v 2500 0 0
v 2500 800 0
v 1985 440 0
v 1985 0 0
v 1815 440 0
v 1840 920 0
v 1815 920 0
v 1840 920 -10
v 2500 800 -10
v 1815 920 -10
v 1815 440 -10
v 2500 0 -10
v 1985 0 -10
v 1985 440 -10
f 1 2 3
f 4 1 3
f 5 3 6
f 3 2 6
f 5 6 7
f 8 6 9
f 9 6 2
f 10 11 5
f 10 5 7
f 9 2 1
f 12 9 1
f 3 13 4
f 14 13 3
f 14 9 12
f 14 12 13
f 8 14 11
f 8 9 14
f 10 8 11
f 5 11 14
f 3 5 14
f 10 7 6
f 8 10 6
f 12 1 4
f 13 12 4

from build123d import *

# Parameters (mm, degrees)
TABAN_FLAN_1_DEPTH         = 10
KES_EKSTR_ZYON1_DEPTH      = 2664.925674639
KES_EKSTR_ZYON1_DEPTH_BACK = 2664.925674639
IZIM2_W                    = 1985
IZIM2_H                    = 440
KES_EKSTR_ZYON2_DEPTH      = 2664.925674639
KES_EKSTR_ZYON2_DEPTH_BACK = 2664.925674639
IZIM4_W                    = 2142.353076874
IZIM4_H                    = 1059.200267334
KES_EKSTR_ZYON3_DEPTH      = 2664.925674639
KES_EKSTR_ZYON3_DEPTH_BACK = 2664.925674639
IZIM5_W                    = 190.659324766
IZIM5_H                    = 598.86582779


# Sheet-metal steps are written as plain solids
with BuildPart() as part:
    # Çizim1 → Taban-Flanş1 (new body)
    with BuildSketch(Plane.XY):
        Polygon((0, 0), (0, 800), (660, 920), (1840, 920), (2500, 800), (2500, 0), align=None)
    extrude(amount=-TABAN_FLAN_1_DEPTH)

    # Çizim2 → Kes-Ekstrüzyon1 (cut, two sides: drawn at the far end of the back side and taken through both)
    with BuildSketch(Plane.XY.offset(-KES_EKSTR_ZYON1_DEPTH_BACK)):
        with Locations((992.5, 220)):
            Rectangle(IZIM2_W, IZIM2_H)
    extrude(amount=KES_EKSTR_ZYON1_DEPTH + KES_EKSTR_ZYON1_DEPTH_BACK, mode=Mode.SUBTRACT)

    # Çizim4 → Kes-Ekstrüzyon2 (cut, two sides: drawn at the far end of the back side and taken through both)
    with BuildSketch(Plane.XY.offset(-KES_EKSTR_ZYON2_DEPTH_BACK)):
        with Locations((741.823461563, 774.473780937)):
            Rectangle(IZIM4_W, IZIM4_H)
    extrude(amount=KES_EKSTR_ZYON2_DEPTH + KES_EKSTR_ZYON2_DEPTH_BACK, mode=Mode.SUBTRACT)

    # Çizim5 → Kes-Ekstrüzyon3 (cut, two sides: drawn at the far end of the back side and taken through both)
    with BuildSketch(Plane.XY.offset(-KES_EKSTR_ZYON3_DEPTH_BACK)):
        with Locations((1719.670337617, 680.404157963)):
            Rectangle(IZIM5_W, IZIM5_H)
    extrude(amount=KES_EKSTR_ZYON3_DEPTH + KES_EKSTR_ZYON3_DEPTH_BACK, mode=Mode.SUBTRACT)


solid = part.part
